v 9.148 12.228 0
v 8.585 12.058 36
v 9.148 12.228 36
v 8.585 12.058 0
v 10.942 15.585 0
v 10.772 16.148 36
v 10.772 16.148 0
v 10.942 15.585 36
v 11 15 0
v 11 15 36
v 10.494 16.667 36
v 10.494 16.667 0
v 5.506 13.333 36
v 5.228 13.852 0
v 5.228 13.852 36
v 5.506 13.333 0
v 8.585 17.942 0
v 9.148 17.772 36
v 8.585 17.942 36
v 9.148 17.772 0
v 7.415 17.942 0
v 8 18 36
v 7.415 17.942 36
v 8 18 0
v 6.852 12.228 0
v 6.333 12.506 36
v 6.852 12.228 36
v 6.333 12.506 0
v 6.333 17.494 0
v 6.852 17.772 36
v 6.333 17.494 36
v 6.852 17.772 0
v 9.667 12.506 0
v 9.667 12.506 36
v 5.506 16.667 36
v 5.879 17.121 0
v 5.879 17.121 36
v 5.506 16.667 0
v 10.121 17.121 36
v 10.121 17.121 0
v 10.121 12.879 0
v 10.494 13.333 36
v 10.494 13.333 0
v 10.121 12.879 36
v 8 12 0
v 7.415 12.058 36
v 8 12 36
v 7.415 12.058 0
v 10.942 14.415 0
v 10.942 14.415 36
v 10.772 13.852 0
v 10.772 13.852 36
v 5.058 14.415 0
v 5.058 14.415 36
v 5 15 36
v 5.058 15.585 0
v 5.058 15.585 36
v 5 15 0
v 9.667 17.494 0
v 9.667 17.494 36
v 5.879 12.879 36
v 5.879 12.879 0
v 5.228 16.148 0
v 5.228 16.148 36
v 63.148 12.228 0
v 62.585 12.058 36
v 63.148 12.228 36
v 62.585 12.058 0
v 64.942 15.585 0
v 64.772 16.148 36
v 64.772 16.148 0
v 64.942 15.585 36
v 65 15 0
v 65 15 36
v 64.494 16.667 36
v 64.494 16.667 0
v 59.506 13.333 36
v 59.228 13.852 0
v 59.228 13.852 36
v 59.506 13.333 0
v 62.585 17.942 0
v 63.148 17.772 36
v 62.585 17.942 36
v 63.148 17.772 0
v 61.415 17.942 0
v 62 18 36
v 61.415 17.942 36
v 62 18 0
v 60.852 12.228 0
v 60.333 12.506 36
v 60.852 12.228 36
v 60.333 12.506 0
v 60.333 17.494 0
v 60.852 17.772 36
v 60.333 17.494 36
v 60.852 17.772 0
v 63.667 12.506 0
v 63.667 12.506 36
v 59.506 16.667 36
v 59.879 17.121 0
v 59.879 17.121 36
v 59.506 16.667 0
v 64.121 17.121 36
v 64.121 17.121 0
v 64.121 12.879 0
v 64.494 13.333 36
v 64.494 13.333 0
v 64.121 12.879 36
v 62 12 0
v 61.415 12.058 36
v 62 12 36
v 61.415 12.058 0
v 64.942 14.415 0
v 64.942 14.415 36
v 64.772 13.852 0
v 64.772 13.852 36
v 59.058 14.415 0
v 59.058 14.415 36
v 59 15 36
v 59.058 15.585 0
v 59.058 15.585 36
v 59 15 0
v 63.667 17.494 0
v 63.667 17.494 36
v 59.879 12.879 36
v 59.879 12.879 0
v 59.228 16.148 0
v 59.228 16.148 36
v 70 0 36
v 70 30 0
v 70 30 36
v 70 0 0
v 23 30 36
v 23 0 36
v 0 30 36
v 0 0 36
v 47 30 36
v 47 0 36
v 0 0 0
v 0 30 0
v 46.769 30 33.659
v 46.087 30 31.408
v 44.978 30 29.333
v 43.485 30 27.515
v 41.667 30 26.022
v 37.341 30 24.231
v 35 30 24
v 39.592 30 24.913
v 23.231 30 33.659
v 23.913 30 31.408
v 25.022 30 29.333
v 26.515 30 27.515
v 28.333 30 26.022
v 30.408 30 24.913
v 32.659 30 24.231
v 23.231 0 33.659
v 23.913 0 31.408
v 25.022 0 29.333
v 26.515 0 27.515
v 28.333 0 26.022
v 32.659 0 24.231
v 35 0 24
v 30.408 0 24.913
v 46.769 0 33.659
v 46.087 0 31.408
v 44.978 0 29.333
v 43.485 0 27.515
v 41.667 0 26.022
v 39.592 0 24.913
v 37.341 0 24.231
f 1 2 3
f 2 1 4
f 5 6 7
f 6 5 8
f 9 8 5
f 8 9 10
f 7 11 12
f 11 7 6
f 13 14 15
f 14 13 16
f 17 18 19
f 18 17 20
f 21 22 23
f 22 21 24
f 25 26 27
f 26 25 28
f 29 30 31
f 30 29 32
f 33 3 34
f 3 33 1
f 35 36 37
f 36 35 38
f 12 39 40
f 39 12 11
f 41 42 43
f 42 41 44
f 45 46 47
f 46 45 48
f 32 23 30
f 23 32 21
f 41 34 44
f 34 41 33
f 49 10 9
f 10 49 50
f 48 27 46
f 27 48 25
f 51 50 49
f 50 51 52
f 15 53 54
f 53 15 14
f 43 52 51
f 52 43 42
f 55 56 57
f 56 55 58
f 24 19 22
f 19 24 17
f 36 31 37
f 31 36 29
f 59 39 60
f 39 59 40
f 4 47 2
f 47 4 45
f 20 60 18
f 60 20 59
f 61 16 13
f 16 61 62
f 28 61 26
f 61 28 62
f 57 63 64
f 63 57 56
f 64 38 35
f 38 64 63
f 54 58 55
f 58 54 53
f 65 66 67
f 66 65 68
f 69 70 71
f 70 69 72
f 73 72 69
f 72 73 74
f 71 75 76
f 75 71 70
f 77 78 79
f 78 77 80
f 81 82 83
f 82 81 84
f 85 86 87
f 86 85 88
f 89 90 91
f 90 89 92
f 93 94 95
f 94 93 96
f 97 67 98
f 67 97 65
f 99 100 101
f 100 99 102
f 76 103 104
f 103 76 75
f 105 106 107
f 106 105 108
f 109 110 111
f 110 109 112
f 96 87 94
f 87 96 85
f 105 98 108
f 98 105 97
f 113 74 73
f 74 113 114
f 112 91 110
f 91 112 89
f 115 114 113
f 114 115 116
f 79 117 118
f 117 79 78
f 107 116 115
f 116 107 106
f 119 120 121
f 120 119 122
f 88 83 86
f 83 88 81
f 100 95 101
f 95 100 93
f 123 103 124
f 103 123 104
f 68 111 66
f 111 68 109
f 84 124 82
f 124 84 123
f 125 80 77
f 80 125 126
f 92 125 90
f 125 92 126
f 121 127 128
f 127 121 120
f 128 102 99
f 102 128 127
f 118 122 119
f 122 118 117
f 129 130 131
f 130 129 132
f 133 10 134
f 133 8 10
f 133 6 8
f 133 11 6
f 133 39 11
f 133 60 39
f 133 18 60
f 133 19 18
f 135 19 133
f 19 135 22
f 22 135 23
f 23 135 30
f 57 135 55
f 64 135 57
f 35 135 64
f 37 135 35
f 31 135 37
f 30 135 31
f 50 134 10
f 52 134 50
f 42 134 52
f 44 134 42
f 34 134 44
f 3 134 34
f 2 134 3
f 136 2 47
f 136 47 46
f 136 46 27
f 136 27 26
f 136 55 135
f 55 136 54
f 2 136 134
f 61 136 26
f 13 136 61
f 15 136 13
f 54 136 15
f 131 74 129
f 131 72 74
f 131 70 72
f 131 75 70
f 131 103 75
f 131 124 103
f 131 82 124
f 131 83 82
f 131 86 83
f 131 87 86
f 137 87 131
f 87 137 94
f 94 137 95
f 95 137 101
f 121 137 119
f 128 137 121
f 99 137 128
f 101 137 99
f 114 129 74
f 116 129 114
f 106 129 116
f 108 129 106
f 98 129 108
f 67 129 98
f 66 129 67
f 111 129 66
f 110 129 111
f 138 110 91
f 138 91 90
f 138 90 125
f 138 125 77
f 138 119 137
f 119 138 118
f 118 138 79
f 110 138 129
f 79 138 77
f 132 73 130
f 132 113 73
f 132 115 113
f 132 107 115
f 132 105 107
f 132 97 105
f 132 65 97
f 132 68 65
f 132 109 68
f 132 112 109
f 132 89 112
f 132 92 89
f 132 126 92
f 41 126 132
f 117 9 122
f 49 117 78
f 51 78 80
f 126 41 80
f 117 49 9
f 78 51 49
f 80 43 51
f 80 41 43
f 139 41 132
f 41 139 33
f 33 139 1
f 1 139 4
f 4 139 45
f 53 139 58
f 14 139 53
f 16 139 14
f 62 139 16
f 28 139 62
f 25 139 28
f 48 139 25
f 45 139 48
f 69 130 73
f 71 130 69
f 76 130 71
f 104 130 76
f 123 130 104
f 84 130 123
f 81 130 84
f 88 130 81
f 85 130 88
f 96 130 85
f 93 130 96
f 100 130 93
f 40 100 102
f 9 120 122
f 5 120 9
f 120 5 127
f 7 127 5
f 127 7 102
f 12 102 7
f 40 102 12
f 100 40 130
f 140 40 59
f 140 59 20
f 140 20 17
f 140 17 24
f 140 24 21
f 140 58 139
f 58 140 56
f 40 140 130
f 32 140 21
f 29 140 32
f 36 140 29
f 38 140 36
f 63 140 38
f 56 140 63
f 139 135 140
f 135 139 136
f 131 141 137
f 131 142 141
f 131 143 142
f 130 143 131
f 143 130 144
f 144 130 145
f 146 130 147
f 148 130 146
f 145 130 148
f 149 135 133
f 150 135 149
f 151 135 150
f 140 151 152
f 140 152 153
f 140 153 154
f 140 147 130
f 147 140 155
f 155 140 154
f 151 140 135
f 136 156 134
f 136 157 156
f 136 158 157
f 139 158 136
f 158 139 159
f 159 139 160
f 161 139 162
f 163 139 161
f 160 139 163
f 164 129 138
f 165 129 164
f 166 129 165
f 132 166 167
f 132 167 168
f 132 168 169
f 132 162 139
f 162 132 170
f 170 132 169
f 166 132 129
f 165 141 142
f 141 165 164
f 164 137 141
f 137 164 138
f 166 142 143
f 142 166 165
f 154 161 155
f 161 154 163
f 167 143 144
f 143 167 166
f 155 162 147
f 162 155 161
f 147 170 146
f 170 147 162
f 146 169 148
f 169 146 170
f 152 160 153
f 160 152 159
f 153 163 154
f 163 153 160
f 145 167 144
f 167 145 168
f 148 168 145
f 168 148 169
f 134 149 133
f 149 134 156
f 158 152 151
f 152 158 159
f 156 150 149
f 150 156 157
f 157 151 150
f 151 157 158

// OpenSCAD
$fn = 32;

// ----------------------------------------------------------------------
// Saddle clamp: plain shaft clamp
// ----------------------------------------------------------------------

// --- parameters (mm) ---
blk_l = 70;               // block length, X
blk_w = 30;               // block width, Y
blk_h = 36;               // block height
clamp_r = 12;             // shaft groove radius
hole_r = 3;               // bolt hole radius
hole_m = 8;               // bolt hole margin from the ends

saw_depth = clamp_r + 3;  // saw kerf depth

difference() {
  cube([blk_l, blk_w, blk_h]);
  translate([blk_l / 2, -1, blk_h])
    rotate([-90, 0, 0])
      cylinder(h = blk_w + 2, r = clamp_r);
  for (sx = [0, 1])
    translate([sx ? blk_l - hole_m : hole_m, blk_w / 2, -1])
      cylinder(r = hole_r, h = blk_h + 2);
}
